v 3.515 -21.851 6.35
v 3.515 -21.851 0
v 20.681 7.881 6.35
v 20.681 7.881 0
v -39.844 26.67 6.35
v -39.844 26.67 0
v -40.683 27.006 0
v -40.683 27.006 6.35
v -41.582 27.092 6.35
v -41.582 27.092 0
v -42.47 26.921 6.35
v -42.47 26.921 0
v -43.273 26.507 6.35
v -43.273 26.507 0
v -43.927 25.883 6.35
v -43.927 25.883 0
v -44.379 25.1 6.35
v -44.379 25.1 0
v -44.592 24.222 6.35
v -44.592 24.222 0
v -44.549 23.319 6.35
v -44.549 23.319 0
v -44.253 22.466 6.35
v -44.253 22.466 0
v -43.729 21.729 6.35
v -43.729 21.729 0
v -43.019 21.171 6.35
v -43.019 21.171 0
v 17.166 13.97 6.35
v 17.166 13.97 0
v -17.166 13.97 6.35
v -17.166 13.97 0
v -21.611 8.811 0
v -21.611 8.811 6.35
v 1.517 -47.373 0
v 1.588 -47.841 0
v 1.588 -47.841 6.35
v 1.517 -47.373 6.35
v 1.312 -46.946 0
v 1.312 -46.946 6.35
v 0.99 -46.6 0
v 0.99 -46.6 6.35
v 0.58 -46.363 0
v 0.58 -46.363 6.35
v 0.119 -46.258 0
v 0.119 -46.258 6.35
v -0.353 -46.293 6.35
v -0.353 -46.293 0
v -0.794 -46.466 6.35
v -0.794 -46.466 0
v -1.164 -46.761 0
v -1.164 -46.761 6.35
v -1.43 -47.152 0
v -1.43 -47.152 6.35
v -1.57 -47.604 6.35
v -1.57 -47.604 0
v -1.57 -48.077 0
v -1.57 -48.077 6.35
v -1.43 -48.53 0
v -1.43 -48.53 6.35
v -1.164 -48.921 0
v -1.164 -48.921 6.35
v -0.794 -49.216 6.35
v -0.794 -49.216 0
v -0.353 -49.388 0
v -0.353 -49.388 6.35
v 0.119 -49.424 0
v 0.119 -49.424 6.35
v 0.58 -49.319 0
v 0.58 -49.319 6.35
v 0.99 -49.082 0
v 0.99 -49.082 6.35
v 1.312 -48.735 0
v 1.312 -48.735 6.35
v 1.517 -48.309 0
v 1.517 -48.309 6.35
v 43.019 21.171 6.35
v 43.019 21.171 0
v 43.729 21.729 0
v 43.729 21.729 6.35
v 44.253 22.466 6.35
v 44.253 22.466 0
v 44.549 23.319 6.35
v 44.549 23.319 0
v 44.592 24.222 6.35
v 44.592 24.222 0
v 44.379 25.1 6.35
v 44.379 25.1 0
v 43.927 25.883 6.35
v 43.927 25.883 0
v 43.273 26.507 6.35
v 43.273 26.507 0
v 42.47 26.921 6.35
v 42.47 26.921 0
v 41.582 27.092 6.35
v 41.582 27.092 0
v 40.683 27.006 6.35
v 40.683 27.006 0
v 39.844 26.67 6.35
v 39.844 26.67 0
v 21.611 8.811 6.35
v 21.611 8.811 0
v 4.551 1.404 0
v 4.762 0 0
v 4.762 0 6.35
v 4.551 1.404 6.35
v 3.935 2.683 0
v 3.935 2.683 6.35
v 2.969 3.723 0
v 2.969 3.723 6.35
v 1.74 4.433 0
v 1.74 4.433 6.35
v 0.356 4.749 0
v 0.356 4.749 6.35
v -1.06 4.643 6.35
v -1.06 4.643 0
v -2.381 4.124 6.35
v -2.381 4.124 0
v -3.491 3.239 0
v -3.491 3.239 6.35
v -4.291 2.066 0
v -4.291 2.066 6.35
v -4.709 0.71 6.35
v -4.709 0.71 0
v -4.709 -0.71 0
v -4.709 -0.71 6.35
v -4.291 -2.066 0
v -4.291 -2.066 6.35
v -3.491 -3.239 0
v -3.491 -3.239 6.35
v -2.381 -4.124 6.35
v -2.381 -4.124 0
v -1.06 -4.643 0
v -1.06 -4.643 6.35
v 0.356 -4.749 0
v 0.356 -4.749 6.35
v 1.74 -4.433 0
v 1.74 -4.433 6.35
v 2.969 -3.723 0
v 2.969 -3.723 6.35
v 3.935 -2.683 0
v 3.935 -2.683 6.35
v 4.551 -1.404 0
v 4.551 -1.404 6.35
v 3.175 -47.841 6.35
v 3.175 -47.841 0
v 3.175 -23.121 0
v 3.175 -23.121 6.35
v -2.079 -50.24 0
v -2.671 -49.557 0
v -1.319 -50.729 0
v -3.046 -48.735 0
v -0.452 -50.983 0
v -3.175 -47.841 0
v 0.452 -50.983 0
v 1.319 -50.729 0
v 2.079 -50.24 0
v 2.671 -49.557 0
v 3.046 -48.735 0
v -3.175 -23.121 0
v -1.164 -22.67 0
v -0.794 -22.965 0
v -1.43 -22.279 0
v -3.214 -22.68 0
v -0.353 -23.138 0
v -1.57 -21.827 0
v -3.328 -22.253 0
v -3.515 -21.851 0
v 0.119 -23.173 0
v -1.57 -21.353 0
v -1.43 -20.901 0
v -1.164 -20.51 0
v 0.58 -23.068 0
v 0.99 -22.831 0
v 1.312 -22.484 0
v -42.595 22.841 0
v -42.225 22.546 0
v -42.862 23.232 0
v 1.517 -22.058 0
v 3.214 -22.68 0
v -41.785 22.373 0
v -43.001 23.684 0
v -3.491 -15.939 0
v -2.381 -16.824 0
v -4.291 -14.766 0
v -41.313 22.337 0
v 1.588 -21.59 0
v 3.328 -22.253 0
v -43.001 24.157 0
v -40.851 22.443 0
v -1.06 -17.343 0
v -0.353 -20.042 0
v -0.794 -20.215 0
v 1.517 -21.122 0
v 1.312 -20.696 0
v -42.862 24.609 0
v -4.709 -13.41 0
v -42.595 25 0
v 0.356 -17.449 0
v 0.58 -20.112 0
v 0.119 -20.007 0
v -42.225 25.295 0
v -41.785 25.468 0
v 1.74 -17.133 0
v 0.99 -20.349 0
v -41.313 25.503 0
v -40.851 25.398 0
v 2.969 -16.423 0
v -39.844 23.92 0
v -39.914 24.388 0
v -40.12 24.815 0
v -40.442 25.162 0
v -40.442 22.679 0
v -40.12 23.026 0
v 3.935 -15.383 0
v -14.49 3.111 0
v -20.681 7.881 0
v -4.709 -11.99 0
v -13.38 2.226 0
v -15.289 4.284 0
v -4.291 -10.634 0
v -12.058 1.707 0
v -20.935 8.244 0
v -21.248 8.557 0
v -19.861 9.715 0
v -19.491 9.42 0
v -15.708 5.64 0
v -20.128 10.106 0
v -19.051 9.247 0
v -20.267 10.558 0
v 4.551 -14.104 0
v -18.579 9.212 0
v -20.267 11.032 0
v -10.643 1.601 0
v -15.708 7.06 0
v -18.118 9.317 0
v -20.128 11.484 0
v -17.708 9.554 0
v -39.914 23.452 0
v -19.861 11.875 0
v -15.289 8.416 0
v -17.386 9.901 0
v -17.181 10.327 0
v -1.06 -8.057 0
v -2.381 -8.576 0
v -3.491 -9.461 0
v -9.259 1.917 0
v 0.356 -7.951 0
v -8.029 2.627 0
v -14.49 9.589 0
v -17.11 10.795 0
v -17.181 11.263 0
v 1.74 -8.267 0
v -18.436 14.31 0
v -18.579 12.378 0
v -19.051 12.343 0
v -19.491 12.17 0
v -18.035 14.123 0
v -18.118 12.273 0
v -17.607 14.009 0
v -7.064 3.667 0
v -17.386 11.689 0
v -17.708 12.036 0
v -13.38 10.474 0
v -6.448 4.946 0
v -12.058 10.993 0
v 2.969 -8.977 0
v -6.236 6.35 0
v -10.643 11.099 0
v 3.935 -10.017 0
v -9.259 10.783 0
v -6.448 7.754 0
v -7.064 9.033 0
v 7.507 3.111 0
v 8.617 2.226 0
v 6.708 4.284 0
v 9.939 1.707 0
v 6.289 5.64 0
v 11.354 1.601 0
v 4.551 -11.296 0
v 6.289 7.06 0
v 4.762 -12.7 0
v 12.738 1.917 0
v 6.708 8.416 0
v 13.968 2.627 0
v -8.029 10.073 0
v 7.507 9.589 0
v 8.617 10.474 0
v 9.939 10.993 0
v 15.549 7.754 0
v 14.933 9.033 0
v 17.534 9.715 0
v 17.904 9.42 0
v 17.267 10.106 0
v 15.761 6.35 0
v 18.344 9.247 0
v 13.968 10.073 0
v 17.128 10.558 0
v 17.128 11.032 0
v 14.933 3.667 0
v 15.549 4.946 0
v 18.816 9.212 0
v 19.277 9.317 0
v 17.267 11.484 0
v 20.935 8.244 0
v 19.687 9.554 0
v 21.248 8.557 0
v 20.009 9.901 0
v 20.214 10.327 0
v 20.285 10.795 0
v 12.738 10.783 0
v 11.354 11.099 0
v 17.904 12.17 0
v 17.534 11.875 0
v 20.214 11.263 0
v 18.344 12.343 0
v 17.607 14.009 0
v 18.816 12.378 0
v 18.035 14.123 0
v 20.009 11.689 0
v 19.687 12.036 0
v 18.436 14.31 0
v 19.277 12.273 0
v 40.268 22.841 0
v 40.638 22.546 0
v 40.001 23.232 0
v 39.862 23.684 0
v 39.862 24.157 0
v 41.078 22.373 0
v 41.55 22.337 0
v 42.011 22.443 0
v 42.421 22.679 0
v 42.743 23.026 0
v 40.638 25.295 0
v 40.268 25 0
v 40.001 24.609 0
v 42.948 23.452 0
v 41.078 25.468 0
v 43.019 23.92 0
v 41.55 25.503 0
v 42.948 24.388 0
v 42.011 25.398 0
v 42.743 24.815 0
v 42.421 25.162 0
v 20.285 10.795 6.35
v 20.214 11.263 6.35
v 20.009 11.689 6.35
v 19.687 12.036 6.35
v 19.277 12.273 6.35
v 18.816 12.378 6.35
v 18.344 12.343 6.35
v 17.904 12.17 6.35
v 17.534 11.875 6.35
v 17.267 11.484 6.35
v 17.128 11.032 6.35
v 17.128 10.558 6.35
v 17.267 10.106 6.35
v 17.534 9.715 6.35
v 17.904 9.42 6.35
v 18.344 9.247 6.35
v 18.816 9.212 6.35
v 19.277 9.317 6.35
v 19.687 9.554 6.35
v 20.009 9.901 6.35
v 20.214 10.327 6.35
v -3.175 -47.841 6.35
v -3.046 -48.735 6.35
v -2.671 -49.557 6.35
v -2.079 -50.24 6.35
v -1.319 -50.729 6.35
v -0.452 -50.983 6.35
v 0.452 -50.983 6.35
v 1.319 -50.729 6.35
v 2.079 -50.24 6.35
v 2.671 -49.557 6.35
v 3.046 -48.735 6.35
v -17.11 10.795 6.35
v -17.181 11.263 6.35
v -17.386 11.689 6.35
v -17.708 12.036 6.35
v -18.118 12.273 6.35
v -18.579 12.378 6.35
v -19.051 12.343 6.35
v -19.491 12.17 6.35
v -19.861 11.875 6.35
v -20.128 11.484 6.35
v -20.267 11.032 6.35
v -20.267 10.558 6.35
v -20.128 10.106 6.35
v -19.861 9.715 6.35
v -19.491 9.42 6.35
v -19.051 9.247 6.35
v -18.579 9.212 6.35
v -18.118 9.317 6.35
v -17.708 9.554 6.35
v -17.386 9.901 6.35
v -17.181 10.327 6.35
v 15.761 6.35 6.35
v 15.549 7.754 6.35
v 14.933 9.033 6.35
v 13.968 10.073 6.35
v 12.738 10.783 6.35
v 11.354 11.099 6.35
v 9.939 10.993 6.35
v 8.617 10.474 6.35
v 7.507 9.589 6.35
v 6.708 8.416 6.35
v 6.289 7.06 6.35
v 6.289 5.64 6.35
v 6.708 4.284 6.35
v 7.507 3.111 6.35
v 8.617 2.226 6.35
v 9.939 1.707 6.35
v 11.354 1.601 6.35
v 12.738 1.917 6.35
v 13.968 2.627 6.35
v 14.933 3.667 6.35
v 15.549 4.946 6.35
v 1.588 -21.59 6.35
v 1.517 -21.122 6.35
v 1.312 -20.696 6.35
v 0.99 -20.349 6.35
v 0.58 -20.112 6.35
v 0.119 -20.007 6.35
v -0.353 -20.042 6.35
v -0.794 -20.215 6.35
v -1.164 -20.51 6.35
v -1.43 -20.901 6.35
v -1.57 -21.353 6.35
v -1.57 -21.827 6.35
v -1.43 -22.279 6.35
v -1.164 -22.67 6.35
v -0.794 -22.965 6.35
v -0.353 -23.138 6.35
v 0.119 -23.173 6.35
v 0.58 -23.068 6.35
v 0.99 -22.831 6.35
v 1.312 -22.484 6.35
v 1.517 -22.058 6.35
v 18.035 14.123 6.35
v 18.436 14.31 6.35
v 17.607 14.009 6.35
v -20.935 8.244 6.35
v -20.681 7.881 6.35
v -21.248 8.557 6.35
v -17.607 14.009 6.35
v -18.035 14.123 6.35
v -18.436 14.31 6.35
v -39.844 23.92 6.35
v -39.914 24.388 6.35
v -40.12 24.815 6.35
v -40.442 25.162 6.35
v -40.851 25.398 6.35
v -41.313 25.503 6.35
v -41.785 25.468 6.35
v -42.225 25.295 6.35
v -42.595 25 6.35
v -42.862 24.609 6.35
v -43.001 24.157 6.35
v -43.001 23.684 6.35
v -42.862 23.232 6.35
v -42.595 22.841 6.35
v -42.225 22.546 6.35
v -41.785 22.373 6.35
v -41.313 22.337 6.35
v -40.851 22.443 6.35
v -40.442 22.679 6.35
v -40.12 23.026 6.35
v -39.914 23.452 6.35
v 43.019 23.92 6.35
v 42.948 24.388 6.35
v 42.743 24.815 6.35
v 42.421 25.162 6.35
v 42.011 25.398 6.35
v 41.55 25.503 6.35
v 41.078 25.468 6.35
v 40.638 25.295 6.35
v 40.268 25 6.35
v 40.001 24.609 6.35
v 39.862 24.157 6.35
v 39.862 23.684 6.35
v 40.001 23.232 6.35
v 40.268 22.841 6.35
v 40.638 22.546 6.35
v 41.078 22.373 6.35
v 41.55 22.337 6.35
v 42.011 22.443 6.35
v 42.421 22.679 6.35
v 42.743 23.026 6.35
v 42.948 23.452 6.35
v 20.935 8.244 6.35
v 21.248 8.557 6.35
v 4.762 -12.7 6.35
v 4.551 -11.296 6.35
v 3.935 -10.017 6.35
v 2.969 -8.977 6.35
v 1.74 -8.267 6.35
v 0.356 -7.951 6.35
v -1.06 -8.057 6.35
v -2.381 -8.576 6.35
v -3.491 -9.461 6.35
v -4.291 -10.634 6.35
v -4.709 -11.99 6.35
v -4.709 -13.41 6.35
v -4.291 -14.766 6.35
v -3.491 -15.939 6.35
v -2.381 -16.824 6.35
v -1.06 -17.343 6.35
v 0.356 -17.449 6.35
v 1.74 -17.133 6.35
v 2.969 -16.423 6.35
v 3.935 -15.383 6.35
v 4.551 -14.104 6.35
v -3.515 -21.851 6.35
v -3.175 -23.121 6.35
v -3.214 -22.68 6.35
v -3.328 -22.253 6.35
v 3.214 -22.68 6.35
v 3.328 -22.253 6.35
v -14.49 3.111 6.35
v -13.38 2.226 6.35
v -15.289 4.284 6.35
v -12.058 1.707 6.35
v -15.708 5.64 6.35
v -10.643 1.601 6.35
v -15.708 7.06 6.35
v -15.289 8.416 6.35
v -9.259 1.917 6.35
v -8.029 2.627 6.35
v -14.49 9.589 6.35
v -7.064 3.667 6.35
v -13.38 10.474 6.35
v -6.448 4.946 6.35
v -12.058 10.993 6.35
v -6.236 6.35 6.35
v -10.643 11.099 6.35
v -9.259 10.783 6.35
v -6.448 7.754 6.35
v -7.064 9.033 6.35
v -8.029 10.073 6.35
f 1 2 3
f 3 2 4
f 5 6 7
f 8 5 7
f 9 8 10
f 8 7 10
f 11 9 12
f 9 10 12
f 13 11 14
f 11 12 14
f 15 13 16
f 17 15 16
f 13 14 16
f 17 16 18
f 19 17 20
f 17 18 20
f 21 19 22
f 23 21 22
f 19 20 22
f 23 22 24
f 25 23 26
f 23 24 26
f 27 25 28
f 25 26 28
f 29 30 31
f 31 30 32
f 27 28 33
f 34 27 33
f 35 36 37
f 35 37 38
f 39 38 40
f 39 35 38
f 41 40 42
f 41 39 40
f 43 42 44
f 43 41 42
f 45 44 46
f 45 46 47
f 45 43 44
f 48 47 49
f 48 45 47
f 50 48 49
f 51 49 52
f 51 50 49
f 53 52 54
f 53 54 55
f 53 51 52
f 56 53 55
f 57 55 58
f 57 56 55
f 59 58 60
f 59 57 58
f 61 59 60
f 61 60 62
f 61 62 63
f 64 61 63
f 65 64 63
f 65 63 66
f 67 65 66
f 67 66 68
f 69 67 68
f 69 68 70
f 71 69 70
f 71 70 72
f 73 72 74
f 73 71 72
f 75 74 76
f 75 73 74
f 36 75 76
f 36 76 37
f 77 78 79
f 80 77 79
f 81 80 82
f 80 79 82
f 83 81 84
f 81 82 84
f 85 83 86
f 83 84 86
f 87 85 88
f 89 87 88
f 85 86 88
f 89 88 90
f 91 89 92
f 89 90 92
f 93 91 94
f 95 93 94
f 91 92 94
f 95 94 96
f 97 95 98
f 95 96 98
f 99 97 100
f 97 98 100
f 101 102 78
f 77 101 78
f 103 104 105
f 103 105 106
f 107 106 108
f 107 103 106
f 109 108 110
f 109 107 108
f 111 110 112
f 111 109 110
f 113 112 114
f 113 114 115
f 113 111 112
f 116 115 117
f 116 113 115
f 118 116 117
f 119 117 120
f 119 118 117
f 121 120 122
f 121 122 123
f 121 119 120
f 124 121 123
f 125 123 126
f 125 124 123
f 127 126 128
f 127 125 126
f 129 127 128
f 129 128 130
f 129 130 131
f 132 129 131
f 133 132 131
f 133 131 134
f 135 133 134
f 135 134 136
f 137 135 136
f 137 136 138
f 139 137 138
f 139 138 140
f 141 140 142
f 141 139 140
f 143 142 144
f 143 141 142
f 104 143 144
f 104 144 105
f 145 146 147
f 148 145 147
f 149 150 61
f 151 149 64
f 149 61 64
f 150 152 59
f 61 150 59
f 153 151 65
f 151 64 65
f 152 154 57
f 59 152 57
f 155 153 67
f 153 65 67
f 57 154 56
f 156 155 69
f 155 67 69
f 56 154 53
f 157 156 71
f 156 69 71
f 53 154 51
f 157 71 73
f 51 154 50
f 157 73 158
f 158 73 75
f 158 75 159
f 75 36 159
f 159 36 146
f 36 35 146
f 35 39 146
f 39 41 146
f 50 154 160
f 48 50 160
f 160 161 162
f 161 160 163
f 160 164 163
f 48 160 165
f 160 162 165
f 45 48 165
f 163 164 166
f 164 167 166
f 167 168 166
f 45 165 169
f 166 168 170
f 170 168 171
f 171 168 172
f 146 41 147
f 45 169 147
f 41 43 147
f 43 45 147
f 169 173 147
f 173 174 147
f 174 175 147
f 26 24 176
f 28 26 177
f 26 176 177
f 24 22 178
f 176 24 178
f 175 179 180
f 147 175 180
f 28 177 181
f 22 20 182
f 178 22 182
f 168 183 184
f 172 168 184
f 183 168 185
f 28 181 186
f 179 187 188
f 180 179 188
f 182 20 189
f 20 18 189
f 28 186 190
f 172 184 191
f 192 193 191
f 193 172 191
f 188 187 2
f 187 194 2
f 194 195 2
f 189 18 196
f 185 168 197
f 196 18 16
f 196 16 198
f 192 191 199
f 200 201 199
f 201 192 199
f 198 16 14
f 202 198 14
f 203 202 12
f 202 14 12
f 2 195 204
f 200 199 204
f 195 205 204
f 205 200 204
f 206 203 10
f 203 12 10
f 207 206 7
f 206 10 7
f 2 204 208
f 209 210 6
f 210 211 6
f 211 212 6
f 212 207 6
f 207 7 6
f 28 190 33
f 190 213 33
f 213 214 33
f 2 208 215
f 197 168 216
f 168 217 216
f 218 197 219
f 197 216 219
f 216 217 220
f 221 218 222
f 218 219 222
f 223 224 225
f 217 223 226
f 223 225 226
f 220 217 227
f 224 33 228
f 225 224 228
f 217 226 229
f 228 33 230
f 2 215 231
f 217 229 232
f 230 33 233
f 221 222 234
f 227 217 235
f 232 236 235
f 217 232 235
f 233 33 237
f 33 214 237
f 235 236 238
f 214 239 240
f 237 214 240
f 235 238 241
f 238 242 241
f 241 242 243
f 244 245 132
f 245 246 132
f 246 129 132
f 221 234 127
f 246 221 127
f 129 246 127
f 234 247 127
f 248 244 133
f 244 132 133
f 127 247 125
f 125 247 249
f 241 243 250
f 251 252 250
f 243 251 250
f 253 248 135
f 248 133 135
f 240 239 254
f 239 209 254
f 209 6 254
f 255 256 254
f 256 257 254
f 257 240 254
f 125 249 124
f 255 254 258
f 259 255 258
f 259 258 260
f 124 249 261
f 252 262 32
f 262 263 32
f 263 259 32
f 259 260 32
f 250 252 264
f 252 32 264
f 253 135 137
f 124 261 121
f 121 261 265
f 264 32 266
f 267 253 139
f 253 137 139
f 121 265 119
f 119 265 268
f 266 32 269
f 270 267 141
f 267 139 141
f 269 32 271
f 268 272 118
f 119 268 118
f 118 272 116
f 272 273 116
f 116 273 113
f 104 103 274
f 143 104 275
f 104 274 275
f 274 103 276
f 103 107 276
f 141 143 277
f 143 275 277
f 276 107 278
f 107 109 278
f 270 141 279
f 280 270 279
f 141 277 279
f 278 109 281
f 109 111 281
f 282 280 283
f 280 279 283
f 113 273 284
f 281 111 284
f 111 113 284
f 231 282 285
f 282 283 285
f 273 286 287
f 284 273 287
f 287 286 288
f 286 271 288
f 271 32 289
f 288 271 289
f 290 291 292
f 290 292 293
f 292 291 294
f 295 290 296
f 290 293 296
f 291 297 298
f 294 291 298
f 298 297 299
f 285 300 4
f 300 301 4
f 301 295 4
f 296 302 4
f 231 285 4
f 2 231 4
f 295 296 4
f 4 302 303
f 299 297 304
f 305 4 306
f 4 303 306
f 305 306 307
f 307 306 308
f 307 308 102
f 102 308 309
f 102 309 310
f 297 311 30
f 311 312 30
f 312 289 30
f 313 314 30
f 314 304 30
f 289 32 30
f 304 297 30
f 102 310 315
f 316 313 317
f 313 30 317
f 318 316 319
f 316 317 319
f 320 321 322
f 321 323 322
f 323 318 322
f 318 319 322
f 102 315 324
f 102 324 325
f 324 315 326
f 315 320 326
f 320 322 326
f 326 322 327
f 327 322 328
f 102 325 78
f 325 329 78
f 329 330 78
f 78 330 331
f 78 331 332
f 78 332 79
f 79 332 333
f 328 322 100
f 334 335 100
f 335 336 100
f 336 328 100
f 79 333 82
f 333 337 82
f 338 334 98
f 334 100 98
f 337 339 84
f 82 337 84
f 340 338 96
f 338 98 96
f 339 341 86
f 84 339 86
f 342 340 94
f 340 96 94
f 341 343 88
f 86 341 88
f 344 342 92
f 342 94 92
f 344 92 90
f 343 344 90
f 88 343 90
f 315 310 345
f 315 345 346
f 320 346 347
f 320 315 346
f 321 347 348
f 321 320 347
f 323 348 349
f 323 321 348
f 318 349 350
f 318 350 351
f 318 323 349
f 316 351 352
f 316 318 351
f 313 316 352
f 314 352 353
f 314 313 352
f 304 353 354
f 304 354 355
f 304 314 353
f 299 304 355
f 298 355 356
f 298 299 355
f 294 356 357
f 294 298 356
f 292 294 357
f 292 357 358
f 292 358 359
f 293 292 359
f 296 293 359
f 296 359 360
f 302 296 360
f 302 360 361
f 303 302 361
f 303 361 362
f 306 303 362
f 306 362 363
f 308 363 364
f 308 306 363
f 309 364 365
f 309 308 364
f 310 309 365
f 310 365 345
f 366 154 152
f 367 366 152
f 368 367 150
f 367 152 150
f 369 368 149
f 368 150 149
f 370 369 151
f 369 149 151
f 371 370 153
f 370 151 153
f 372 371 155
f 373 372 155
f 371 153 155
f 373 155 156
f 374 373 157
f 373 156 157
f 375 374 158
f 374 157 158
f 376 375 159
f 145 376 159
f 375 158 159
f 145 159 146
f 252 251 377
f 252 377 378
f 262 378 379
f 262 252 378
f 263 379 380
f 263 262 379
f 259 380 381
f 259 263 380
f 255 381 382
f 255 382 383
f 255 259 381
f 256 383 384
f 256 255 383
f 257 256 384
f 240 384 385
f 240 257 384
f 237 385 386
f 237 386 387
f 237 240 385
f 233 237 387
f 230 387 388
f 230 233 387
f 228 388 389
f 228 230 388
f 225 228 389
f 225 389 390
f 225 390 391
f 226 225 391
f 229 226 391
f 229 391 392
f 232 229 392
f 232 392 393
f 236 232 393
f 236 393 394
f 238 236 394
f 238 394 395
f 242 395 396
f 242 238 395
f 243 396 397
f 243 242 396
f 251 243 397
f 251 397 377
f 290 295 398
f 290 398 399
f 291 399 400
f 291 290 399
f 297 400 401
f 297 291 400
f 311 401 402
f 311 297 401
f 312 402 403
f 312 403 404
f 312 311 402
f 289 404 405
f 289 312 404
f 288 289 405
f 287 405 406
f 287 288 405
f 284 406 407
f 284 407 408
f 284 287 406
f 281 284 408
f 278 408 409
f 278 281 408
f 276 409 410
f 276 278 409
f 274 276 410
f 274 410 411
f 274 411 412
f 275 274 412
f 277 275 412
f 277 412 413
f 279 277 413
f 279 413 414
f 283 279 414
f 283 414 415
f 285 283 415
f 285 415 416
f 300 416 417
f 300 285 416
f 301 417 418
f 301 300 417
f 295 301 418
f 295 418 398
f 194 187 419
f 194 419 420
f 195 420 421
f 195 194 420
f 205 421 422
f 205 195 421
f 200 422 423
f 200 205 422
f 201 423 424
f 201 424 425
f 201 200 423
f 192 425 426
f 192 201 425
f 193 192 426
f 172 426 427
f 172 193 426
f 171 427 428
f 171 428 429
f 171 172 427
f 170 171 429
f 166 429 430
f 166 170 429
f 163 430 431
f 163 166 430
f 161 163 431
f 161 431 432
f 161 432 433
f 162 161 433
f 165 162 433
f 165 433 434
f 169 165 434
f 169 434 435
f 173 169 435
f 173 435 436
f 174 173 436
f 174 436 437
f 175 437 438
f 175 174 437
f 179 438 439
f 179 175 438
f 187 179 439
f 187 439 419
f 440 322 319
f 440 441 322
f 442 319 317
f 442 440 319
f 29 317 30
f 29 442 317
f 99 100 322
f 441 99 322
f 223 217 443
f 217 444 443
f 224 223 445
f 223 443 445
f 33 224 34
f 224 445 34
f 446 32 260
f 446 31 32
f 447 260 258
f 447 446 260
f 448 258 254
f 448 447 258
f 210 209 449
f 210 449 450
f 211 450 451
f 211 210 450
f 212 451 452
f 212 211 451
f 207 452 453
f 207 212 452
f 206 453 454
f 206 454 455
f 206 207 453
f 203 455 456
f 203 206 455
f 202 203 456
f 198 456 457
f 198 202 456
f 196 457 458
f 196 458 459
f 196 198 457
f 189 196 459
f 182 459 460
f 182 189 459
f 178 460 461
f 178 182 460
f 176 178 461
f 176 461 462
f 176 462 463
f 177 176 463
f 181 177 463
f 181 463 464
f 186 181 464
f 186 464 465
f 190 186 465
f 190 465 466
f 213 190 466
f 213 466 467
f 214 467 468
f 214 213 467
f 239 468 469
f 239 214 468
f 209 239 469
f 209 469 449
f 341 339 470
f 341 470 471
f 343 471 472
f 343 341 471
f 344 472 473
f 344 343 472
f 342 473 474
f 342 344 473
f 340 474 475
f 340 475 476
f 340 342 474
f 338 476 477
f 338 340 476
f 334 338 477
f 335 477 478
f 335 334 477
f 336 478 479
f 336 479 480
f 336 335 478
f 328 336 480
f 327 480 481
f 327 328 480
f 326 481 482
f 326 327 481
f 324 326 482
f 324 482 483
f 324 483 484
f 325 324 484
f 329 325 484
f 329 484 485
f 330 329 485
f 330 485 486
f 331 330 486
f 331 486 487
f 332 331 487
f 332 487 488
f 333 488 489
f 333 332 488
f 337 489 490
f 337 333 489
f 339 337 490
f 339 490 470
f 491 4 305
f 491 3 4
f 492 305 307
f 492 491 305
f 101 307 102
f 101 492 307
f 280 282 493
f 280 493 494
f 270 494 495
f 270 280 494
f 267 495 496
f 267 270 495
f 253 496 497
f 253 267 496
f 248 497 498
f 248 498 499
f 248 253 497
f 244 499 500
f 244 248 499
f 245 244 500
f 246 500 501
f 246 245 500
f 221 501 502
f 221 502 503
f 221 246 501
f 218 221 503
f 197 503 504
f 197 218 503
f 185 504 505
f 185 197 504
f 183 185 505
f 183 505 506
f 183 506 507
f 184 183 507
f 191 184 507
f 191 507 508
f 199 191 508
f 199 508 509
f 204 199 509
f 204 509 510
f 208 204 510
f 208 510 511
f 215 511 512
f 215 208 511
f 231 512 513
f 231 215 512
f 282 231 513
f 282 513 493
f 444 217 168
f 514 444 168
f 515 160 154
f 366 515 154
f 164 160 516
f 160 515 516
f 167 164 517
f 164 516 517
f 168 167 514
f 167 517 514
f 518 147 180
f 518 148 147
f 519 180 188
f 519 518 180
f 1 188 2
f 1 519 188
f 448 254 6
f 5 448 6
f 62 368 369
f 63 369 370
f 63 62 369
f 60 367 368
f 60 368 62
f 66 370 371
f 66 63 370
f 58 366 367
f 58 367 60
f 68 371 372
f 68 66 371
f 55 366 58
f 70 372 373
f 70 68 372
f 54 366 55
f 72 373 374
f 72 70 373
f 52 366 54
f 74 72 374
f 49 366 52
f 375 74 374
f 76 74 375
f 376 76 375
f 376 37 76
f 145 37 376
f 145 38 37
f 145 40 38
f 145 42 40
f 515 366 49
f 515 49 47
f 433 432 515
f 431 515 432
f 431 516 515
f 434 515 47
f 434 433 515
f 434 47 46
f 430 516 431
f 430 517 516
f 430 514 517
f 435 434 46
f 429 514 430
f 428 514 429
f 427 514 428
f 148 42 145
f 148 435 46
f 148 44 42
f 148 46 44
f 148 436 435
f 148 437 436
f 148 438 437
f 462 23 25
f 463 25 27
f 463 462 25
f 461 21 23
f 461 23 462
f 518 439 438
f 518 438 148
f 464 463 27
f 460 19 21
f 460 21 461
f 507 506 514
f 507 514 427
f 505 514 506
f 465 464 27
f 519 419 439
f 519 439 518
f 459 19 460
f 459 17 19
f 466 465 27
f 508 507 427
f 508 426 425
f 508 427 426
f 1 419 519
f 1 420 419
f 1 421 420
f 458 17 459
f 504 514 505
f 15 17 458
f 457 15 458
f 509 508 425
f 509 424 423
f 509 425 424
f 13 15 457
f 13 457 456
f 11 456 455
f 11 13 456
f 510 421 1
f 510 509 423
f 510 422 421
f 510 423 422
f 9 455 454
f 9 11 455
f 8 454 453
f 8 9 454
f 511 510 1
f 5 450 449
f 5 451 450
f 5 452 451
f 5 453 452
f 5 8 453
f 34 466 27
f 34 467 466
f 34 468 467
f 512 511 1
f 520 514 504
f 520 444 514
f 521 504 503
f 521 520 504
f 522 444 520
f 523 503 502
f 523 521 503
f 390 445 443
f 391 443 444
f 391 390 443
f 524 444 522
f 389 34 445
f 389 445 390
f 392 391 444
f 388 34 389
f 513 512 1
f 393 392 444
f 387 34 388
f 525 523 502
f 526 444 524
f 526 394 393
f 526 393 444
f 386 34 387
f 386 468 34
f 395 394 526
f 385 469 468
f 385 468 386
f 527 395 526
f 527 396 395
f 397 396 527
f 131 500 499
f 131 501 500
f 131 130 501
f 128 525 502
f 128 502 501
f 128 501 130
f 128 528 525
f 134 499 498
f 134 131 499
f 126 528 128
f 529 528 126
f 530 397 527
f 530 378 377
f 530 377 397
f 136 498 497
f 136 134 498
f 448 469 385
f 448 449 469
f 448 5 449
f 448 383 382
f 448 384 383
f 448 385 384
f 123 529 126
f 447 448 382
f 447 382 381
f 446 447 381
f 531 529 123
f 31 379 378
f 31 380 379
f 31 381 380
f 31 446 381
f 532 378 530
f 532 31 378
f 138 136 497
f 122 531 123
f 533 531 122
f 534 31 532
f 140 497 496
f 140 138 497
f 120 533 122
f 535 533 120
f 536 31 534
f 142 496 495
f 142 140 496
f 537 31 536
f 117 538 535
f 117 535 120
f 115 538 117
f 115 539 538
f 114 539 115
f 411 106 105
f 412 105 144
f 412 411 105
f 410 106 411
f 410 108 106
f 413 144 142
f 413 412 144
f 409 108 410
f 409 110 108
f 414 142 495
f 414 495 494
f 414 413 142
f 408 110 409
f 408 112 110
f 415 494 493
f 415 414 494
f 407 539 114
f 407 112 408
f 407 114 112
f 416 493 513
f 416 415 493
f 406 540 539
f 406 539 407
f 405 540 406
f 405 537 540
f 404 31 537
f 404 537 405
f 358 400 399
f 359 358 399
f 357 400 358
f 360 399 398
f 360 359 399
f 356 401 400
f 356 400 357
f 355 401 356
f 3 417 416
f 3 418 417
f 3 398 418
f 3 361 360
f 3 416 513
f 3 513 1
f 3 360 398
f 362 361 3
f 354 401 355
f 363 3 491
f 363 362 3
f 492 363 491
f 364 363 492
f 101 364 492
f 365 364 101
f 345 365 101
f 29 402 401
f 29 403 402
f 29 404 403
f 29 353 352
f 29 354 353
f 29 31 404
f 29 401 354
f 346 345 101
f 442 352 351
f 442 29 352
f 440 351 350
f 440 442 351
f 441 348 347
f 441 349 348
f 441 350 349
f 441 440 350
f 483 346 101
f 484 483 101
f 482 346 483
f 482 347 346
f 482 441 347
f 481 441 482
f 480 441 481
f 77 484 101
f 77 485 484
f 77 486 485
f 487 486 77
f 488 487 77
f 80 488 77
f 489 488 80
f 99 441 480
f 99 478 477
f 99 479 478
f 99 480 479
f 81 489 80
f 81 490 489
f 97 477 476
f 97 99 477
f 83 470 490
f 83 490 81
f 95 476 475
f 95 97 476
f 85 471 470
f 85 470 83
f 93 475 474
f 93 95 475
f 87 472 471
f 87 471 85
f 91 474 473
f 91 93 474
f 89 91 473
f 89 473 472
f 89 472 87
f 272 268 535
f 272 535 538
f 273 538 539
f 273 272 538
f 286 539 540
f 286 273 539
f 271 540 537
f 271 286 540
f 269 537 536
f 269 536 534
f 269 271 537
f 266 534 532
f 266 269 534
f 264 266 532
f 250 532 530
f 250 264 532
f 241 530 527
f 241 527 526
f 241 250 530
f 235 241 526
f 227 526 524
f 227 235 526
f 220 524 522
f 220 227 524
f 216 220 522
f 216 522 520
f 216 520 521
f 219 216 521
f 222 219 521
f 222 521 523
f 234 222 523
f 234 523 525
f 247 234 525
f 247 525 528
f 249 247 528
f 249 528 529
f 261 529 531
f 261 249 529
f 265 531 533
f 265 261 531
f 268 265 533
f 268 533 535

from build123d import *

# Parameters (mm, degrees)
F0_R     = 1.5875
F0_R_2   = 4.7625
F1_DEPTH = 6.35
F2_R     = 2.54


# Not quite as in the source:
# - a length typed as a fraction of an inch, garbled in the dataset ("3 / 203.2 mm" for 3/8 in), is restored


with BuildPart() as f1:
    # F0 (on Top) → F1 (new body)
    with BuildSketch(Plane.XY):
        with BuildLine():
            Line((3.175, -22.440738686), (0, -27.94))
            Line((0, -27.94), (-3.175, -22.440738686))
            Line((-3.175, -22.440738686), (-3.175, -47.840738686))
            ThreePointArc((-3.175, -47.840738686), (0, -51.015738686), (3.175, -47.840738686))
            Line((3.175, -47.840738686), (3.175, -22.440738686))
        make_face()
        with Locations((0, -47.840738686)):
            Circle(F0_R, mode=Mode.SUBTRACT)
        Polygon((-3.175, -22.440738686), (0, -27.94), (3.175, -22.440738686), (21.0217497817, 8.470738686), (24.1967497817, 13.97), (17.8467497817, 13.97), (-17.8467497817, 13.97), (-24.1967497817, 13.97), (-21.0217497817, 8.470738686), align=None)
        with Locations((0, -21.59)):
            Circle(F0_R, mode=Mode.SUBTRACT)
        with Locations((0, -12.7)):
            Circle(F0_R_2, mode=Mode.SUBTRACT)
        Circle(F0_R_2, mode=Mode.SUBTRACT)
        with Locations((-10.9985226281, 6.35)):
            Circle(F0_R_2, mode=Mode.SUBTRACT)
        with Locations((-18.6974884677, 10.795)):
            Circle(F0_R, mode=Mode.SUBTRACT)
        with Locations((10.9985226281, 6.35)):
            Circle(F0_R_2, mode=Mode.SUBTRACT)
        with Locations((18.6974884677, 10.795)):
            Circle(F0_R, mode=Mode.SUBTRACT)
        with BuildLine():
            Line((-43.0187950379, 21.170738686), (-21.0217497817, 8.470738686))
            Line((-21.0217497817, 8.470738686), (-24.1967497817, 13.97))
            Line((-24.1967497817, 13.97), (-17.8467497817, 13.97))
            Line((-17.8467497817, 13.97), (-39.8437950379, 26.67))
            ThreePointArc((-39.8437950379, 26.67), (-44.1809256949, 25.507869343), (-43.0187950379, 21.170738686))
        make_face()
        with Locations((-41.4312950379, 23.920369343)):
            Circle(F0_R, mode=Mode.SUBTRACT)
        with BuildLine():
            Line((24.1967497817, 13.97), (21.0217497817, 8.470738686))
            Line((21.0217497817, 8.470738686), (43.0187950379, 21.170738686))
            ThreePointArc((43.0187950379, 21.170738686), (44.1809256949, 25.507869343), (39.8437950379, 26.67))
            Line((39.8437950379, 26.67), (17.8467497817, 13.97))
            Line((17.8467497817, 13.97), (24.1967497817, 13.97))
        make_face()
        with Locations((41.4312950379, 23.920369343)):
            Circle(F0_R, mode=Mode.SUBTRACT)
    extrude(amount=F1_DEPTH)

    # F2
    f2_edges = [f1.edges().sort_by_distance(p)[0] for p in [
        (-3.175, -22.440739, 3.175),
        (-21.02175, 8.470739, 3.175),
        (-17.84675, 13.97, 3.175),
        (17.84675, 13.97, 3.175),
        (21.02175, 8.470739, 3.175),
        (3.175, -22.440739, 3.175),
    ]]
    fillet(f2_edges, radius=F2_R)


solid = f1.part
